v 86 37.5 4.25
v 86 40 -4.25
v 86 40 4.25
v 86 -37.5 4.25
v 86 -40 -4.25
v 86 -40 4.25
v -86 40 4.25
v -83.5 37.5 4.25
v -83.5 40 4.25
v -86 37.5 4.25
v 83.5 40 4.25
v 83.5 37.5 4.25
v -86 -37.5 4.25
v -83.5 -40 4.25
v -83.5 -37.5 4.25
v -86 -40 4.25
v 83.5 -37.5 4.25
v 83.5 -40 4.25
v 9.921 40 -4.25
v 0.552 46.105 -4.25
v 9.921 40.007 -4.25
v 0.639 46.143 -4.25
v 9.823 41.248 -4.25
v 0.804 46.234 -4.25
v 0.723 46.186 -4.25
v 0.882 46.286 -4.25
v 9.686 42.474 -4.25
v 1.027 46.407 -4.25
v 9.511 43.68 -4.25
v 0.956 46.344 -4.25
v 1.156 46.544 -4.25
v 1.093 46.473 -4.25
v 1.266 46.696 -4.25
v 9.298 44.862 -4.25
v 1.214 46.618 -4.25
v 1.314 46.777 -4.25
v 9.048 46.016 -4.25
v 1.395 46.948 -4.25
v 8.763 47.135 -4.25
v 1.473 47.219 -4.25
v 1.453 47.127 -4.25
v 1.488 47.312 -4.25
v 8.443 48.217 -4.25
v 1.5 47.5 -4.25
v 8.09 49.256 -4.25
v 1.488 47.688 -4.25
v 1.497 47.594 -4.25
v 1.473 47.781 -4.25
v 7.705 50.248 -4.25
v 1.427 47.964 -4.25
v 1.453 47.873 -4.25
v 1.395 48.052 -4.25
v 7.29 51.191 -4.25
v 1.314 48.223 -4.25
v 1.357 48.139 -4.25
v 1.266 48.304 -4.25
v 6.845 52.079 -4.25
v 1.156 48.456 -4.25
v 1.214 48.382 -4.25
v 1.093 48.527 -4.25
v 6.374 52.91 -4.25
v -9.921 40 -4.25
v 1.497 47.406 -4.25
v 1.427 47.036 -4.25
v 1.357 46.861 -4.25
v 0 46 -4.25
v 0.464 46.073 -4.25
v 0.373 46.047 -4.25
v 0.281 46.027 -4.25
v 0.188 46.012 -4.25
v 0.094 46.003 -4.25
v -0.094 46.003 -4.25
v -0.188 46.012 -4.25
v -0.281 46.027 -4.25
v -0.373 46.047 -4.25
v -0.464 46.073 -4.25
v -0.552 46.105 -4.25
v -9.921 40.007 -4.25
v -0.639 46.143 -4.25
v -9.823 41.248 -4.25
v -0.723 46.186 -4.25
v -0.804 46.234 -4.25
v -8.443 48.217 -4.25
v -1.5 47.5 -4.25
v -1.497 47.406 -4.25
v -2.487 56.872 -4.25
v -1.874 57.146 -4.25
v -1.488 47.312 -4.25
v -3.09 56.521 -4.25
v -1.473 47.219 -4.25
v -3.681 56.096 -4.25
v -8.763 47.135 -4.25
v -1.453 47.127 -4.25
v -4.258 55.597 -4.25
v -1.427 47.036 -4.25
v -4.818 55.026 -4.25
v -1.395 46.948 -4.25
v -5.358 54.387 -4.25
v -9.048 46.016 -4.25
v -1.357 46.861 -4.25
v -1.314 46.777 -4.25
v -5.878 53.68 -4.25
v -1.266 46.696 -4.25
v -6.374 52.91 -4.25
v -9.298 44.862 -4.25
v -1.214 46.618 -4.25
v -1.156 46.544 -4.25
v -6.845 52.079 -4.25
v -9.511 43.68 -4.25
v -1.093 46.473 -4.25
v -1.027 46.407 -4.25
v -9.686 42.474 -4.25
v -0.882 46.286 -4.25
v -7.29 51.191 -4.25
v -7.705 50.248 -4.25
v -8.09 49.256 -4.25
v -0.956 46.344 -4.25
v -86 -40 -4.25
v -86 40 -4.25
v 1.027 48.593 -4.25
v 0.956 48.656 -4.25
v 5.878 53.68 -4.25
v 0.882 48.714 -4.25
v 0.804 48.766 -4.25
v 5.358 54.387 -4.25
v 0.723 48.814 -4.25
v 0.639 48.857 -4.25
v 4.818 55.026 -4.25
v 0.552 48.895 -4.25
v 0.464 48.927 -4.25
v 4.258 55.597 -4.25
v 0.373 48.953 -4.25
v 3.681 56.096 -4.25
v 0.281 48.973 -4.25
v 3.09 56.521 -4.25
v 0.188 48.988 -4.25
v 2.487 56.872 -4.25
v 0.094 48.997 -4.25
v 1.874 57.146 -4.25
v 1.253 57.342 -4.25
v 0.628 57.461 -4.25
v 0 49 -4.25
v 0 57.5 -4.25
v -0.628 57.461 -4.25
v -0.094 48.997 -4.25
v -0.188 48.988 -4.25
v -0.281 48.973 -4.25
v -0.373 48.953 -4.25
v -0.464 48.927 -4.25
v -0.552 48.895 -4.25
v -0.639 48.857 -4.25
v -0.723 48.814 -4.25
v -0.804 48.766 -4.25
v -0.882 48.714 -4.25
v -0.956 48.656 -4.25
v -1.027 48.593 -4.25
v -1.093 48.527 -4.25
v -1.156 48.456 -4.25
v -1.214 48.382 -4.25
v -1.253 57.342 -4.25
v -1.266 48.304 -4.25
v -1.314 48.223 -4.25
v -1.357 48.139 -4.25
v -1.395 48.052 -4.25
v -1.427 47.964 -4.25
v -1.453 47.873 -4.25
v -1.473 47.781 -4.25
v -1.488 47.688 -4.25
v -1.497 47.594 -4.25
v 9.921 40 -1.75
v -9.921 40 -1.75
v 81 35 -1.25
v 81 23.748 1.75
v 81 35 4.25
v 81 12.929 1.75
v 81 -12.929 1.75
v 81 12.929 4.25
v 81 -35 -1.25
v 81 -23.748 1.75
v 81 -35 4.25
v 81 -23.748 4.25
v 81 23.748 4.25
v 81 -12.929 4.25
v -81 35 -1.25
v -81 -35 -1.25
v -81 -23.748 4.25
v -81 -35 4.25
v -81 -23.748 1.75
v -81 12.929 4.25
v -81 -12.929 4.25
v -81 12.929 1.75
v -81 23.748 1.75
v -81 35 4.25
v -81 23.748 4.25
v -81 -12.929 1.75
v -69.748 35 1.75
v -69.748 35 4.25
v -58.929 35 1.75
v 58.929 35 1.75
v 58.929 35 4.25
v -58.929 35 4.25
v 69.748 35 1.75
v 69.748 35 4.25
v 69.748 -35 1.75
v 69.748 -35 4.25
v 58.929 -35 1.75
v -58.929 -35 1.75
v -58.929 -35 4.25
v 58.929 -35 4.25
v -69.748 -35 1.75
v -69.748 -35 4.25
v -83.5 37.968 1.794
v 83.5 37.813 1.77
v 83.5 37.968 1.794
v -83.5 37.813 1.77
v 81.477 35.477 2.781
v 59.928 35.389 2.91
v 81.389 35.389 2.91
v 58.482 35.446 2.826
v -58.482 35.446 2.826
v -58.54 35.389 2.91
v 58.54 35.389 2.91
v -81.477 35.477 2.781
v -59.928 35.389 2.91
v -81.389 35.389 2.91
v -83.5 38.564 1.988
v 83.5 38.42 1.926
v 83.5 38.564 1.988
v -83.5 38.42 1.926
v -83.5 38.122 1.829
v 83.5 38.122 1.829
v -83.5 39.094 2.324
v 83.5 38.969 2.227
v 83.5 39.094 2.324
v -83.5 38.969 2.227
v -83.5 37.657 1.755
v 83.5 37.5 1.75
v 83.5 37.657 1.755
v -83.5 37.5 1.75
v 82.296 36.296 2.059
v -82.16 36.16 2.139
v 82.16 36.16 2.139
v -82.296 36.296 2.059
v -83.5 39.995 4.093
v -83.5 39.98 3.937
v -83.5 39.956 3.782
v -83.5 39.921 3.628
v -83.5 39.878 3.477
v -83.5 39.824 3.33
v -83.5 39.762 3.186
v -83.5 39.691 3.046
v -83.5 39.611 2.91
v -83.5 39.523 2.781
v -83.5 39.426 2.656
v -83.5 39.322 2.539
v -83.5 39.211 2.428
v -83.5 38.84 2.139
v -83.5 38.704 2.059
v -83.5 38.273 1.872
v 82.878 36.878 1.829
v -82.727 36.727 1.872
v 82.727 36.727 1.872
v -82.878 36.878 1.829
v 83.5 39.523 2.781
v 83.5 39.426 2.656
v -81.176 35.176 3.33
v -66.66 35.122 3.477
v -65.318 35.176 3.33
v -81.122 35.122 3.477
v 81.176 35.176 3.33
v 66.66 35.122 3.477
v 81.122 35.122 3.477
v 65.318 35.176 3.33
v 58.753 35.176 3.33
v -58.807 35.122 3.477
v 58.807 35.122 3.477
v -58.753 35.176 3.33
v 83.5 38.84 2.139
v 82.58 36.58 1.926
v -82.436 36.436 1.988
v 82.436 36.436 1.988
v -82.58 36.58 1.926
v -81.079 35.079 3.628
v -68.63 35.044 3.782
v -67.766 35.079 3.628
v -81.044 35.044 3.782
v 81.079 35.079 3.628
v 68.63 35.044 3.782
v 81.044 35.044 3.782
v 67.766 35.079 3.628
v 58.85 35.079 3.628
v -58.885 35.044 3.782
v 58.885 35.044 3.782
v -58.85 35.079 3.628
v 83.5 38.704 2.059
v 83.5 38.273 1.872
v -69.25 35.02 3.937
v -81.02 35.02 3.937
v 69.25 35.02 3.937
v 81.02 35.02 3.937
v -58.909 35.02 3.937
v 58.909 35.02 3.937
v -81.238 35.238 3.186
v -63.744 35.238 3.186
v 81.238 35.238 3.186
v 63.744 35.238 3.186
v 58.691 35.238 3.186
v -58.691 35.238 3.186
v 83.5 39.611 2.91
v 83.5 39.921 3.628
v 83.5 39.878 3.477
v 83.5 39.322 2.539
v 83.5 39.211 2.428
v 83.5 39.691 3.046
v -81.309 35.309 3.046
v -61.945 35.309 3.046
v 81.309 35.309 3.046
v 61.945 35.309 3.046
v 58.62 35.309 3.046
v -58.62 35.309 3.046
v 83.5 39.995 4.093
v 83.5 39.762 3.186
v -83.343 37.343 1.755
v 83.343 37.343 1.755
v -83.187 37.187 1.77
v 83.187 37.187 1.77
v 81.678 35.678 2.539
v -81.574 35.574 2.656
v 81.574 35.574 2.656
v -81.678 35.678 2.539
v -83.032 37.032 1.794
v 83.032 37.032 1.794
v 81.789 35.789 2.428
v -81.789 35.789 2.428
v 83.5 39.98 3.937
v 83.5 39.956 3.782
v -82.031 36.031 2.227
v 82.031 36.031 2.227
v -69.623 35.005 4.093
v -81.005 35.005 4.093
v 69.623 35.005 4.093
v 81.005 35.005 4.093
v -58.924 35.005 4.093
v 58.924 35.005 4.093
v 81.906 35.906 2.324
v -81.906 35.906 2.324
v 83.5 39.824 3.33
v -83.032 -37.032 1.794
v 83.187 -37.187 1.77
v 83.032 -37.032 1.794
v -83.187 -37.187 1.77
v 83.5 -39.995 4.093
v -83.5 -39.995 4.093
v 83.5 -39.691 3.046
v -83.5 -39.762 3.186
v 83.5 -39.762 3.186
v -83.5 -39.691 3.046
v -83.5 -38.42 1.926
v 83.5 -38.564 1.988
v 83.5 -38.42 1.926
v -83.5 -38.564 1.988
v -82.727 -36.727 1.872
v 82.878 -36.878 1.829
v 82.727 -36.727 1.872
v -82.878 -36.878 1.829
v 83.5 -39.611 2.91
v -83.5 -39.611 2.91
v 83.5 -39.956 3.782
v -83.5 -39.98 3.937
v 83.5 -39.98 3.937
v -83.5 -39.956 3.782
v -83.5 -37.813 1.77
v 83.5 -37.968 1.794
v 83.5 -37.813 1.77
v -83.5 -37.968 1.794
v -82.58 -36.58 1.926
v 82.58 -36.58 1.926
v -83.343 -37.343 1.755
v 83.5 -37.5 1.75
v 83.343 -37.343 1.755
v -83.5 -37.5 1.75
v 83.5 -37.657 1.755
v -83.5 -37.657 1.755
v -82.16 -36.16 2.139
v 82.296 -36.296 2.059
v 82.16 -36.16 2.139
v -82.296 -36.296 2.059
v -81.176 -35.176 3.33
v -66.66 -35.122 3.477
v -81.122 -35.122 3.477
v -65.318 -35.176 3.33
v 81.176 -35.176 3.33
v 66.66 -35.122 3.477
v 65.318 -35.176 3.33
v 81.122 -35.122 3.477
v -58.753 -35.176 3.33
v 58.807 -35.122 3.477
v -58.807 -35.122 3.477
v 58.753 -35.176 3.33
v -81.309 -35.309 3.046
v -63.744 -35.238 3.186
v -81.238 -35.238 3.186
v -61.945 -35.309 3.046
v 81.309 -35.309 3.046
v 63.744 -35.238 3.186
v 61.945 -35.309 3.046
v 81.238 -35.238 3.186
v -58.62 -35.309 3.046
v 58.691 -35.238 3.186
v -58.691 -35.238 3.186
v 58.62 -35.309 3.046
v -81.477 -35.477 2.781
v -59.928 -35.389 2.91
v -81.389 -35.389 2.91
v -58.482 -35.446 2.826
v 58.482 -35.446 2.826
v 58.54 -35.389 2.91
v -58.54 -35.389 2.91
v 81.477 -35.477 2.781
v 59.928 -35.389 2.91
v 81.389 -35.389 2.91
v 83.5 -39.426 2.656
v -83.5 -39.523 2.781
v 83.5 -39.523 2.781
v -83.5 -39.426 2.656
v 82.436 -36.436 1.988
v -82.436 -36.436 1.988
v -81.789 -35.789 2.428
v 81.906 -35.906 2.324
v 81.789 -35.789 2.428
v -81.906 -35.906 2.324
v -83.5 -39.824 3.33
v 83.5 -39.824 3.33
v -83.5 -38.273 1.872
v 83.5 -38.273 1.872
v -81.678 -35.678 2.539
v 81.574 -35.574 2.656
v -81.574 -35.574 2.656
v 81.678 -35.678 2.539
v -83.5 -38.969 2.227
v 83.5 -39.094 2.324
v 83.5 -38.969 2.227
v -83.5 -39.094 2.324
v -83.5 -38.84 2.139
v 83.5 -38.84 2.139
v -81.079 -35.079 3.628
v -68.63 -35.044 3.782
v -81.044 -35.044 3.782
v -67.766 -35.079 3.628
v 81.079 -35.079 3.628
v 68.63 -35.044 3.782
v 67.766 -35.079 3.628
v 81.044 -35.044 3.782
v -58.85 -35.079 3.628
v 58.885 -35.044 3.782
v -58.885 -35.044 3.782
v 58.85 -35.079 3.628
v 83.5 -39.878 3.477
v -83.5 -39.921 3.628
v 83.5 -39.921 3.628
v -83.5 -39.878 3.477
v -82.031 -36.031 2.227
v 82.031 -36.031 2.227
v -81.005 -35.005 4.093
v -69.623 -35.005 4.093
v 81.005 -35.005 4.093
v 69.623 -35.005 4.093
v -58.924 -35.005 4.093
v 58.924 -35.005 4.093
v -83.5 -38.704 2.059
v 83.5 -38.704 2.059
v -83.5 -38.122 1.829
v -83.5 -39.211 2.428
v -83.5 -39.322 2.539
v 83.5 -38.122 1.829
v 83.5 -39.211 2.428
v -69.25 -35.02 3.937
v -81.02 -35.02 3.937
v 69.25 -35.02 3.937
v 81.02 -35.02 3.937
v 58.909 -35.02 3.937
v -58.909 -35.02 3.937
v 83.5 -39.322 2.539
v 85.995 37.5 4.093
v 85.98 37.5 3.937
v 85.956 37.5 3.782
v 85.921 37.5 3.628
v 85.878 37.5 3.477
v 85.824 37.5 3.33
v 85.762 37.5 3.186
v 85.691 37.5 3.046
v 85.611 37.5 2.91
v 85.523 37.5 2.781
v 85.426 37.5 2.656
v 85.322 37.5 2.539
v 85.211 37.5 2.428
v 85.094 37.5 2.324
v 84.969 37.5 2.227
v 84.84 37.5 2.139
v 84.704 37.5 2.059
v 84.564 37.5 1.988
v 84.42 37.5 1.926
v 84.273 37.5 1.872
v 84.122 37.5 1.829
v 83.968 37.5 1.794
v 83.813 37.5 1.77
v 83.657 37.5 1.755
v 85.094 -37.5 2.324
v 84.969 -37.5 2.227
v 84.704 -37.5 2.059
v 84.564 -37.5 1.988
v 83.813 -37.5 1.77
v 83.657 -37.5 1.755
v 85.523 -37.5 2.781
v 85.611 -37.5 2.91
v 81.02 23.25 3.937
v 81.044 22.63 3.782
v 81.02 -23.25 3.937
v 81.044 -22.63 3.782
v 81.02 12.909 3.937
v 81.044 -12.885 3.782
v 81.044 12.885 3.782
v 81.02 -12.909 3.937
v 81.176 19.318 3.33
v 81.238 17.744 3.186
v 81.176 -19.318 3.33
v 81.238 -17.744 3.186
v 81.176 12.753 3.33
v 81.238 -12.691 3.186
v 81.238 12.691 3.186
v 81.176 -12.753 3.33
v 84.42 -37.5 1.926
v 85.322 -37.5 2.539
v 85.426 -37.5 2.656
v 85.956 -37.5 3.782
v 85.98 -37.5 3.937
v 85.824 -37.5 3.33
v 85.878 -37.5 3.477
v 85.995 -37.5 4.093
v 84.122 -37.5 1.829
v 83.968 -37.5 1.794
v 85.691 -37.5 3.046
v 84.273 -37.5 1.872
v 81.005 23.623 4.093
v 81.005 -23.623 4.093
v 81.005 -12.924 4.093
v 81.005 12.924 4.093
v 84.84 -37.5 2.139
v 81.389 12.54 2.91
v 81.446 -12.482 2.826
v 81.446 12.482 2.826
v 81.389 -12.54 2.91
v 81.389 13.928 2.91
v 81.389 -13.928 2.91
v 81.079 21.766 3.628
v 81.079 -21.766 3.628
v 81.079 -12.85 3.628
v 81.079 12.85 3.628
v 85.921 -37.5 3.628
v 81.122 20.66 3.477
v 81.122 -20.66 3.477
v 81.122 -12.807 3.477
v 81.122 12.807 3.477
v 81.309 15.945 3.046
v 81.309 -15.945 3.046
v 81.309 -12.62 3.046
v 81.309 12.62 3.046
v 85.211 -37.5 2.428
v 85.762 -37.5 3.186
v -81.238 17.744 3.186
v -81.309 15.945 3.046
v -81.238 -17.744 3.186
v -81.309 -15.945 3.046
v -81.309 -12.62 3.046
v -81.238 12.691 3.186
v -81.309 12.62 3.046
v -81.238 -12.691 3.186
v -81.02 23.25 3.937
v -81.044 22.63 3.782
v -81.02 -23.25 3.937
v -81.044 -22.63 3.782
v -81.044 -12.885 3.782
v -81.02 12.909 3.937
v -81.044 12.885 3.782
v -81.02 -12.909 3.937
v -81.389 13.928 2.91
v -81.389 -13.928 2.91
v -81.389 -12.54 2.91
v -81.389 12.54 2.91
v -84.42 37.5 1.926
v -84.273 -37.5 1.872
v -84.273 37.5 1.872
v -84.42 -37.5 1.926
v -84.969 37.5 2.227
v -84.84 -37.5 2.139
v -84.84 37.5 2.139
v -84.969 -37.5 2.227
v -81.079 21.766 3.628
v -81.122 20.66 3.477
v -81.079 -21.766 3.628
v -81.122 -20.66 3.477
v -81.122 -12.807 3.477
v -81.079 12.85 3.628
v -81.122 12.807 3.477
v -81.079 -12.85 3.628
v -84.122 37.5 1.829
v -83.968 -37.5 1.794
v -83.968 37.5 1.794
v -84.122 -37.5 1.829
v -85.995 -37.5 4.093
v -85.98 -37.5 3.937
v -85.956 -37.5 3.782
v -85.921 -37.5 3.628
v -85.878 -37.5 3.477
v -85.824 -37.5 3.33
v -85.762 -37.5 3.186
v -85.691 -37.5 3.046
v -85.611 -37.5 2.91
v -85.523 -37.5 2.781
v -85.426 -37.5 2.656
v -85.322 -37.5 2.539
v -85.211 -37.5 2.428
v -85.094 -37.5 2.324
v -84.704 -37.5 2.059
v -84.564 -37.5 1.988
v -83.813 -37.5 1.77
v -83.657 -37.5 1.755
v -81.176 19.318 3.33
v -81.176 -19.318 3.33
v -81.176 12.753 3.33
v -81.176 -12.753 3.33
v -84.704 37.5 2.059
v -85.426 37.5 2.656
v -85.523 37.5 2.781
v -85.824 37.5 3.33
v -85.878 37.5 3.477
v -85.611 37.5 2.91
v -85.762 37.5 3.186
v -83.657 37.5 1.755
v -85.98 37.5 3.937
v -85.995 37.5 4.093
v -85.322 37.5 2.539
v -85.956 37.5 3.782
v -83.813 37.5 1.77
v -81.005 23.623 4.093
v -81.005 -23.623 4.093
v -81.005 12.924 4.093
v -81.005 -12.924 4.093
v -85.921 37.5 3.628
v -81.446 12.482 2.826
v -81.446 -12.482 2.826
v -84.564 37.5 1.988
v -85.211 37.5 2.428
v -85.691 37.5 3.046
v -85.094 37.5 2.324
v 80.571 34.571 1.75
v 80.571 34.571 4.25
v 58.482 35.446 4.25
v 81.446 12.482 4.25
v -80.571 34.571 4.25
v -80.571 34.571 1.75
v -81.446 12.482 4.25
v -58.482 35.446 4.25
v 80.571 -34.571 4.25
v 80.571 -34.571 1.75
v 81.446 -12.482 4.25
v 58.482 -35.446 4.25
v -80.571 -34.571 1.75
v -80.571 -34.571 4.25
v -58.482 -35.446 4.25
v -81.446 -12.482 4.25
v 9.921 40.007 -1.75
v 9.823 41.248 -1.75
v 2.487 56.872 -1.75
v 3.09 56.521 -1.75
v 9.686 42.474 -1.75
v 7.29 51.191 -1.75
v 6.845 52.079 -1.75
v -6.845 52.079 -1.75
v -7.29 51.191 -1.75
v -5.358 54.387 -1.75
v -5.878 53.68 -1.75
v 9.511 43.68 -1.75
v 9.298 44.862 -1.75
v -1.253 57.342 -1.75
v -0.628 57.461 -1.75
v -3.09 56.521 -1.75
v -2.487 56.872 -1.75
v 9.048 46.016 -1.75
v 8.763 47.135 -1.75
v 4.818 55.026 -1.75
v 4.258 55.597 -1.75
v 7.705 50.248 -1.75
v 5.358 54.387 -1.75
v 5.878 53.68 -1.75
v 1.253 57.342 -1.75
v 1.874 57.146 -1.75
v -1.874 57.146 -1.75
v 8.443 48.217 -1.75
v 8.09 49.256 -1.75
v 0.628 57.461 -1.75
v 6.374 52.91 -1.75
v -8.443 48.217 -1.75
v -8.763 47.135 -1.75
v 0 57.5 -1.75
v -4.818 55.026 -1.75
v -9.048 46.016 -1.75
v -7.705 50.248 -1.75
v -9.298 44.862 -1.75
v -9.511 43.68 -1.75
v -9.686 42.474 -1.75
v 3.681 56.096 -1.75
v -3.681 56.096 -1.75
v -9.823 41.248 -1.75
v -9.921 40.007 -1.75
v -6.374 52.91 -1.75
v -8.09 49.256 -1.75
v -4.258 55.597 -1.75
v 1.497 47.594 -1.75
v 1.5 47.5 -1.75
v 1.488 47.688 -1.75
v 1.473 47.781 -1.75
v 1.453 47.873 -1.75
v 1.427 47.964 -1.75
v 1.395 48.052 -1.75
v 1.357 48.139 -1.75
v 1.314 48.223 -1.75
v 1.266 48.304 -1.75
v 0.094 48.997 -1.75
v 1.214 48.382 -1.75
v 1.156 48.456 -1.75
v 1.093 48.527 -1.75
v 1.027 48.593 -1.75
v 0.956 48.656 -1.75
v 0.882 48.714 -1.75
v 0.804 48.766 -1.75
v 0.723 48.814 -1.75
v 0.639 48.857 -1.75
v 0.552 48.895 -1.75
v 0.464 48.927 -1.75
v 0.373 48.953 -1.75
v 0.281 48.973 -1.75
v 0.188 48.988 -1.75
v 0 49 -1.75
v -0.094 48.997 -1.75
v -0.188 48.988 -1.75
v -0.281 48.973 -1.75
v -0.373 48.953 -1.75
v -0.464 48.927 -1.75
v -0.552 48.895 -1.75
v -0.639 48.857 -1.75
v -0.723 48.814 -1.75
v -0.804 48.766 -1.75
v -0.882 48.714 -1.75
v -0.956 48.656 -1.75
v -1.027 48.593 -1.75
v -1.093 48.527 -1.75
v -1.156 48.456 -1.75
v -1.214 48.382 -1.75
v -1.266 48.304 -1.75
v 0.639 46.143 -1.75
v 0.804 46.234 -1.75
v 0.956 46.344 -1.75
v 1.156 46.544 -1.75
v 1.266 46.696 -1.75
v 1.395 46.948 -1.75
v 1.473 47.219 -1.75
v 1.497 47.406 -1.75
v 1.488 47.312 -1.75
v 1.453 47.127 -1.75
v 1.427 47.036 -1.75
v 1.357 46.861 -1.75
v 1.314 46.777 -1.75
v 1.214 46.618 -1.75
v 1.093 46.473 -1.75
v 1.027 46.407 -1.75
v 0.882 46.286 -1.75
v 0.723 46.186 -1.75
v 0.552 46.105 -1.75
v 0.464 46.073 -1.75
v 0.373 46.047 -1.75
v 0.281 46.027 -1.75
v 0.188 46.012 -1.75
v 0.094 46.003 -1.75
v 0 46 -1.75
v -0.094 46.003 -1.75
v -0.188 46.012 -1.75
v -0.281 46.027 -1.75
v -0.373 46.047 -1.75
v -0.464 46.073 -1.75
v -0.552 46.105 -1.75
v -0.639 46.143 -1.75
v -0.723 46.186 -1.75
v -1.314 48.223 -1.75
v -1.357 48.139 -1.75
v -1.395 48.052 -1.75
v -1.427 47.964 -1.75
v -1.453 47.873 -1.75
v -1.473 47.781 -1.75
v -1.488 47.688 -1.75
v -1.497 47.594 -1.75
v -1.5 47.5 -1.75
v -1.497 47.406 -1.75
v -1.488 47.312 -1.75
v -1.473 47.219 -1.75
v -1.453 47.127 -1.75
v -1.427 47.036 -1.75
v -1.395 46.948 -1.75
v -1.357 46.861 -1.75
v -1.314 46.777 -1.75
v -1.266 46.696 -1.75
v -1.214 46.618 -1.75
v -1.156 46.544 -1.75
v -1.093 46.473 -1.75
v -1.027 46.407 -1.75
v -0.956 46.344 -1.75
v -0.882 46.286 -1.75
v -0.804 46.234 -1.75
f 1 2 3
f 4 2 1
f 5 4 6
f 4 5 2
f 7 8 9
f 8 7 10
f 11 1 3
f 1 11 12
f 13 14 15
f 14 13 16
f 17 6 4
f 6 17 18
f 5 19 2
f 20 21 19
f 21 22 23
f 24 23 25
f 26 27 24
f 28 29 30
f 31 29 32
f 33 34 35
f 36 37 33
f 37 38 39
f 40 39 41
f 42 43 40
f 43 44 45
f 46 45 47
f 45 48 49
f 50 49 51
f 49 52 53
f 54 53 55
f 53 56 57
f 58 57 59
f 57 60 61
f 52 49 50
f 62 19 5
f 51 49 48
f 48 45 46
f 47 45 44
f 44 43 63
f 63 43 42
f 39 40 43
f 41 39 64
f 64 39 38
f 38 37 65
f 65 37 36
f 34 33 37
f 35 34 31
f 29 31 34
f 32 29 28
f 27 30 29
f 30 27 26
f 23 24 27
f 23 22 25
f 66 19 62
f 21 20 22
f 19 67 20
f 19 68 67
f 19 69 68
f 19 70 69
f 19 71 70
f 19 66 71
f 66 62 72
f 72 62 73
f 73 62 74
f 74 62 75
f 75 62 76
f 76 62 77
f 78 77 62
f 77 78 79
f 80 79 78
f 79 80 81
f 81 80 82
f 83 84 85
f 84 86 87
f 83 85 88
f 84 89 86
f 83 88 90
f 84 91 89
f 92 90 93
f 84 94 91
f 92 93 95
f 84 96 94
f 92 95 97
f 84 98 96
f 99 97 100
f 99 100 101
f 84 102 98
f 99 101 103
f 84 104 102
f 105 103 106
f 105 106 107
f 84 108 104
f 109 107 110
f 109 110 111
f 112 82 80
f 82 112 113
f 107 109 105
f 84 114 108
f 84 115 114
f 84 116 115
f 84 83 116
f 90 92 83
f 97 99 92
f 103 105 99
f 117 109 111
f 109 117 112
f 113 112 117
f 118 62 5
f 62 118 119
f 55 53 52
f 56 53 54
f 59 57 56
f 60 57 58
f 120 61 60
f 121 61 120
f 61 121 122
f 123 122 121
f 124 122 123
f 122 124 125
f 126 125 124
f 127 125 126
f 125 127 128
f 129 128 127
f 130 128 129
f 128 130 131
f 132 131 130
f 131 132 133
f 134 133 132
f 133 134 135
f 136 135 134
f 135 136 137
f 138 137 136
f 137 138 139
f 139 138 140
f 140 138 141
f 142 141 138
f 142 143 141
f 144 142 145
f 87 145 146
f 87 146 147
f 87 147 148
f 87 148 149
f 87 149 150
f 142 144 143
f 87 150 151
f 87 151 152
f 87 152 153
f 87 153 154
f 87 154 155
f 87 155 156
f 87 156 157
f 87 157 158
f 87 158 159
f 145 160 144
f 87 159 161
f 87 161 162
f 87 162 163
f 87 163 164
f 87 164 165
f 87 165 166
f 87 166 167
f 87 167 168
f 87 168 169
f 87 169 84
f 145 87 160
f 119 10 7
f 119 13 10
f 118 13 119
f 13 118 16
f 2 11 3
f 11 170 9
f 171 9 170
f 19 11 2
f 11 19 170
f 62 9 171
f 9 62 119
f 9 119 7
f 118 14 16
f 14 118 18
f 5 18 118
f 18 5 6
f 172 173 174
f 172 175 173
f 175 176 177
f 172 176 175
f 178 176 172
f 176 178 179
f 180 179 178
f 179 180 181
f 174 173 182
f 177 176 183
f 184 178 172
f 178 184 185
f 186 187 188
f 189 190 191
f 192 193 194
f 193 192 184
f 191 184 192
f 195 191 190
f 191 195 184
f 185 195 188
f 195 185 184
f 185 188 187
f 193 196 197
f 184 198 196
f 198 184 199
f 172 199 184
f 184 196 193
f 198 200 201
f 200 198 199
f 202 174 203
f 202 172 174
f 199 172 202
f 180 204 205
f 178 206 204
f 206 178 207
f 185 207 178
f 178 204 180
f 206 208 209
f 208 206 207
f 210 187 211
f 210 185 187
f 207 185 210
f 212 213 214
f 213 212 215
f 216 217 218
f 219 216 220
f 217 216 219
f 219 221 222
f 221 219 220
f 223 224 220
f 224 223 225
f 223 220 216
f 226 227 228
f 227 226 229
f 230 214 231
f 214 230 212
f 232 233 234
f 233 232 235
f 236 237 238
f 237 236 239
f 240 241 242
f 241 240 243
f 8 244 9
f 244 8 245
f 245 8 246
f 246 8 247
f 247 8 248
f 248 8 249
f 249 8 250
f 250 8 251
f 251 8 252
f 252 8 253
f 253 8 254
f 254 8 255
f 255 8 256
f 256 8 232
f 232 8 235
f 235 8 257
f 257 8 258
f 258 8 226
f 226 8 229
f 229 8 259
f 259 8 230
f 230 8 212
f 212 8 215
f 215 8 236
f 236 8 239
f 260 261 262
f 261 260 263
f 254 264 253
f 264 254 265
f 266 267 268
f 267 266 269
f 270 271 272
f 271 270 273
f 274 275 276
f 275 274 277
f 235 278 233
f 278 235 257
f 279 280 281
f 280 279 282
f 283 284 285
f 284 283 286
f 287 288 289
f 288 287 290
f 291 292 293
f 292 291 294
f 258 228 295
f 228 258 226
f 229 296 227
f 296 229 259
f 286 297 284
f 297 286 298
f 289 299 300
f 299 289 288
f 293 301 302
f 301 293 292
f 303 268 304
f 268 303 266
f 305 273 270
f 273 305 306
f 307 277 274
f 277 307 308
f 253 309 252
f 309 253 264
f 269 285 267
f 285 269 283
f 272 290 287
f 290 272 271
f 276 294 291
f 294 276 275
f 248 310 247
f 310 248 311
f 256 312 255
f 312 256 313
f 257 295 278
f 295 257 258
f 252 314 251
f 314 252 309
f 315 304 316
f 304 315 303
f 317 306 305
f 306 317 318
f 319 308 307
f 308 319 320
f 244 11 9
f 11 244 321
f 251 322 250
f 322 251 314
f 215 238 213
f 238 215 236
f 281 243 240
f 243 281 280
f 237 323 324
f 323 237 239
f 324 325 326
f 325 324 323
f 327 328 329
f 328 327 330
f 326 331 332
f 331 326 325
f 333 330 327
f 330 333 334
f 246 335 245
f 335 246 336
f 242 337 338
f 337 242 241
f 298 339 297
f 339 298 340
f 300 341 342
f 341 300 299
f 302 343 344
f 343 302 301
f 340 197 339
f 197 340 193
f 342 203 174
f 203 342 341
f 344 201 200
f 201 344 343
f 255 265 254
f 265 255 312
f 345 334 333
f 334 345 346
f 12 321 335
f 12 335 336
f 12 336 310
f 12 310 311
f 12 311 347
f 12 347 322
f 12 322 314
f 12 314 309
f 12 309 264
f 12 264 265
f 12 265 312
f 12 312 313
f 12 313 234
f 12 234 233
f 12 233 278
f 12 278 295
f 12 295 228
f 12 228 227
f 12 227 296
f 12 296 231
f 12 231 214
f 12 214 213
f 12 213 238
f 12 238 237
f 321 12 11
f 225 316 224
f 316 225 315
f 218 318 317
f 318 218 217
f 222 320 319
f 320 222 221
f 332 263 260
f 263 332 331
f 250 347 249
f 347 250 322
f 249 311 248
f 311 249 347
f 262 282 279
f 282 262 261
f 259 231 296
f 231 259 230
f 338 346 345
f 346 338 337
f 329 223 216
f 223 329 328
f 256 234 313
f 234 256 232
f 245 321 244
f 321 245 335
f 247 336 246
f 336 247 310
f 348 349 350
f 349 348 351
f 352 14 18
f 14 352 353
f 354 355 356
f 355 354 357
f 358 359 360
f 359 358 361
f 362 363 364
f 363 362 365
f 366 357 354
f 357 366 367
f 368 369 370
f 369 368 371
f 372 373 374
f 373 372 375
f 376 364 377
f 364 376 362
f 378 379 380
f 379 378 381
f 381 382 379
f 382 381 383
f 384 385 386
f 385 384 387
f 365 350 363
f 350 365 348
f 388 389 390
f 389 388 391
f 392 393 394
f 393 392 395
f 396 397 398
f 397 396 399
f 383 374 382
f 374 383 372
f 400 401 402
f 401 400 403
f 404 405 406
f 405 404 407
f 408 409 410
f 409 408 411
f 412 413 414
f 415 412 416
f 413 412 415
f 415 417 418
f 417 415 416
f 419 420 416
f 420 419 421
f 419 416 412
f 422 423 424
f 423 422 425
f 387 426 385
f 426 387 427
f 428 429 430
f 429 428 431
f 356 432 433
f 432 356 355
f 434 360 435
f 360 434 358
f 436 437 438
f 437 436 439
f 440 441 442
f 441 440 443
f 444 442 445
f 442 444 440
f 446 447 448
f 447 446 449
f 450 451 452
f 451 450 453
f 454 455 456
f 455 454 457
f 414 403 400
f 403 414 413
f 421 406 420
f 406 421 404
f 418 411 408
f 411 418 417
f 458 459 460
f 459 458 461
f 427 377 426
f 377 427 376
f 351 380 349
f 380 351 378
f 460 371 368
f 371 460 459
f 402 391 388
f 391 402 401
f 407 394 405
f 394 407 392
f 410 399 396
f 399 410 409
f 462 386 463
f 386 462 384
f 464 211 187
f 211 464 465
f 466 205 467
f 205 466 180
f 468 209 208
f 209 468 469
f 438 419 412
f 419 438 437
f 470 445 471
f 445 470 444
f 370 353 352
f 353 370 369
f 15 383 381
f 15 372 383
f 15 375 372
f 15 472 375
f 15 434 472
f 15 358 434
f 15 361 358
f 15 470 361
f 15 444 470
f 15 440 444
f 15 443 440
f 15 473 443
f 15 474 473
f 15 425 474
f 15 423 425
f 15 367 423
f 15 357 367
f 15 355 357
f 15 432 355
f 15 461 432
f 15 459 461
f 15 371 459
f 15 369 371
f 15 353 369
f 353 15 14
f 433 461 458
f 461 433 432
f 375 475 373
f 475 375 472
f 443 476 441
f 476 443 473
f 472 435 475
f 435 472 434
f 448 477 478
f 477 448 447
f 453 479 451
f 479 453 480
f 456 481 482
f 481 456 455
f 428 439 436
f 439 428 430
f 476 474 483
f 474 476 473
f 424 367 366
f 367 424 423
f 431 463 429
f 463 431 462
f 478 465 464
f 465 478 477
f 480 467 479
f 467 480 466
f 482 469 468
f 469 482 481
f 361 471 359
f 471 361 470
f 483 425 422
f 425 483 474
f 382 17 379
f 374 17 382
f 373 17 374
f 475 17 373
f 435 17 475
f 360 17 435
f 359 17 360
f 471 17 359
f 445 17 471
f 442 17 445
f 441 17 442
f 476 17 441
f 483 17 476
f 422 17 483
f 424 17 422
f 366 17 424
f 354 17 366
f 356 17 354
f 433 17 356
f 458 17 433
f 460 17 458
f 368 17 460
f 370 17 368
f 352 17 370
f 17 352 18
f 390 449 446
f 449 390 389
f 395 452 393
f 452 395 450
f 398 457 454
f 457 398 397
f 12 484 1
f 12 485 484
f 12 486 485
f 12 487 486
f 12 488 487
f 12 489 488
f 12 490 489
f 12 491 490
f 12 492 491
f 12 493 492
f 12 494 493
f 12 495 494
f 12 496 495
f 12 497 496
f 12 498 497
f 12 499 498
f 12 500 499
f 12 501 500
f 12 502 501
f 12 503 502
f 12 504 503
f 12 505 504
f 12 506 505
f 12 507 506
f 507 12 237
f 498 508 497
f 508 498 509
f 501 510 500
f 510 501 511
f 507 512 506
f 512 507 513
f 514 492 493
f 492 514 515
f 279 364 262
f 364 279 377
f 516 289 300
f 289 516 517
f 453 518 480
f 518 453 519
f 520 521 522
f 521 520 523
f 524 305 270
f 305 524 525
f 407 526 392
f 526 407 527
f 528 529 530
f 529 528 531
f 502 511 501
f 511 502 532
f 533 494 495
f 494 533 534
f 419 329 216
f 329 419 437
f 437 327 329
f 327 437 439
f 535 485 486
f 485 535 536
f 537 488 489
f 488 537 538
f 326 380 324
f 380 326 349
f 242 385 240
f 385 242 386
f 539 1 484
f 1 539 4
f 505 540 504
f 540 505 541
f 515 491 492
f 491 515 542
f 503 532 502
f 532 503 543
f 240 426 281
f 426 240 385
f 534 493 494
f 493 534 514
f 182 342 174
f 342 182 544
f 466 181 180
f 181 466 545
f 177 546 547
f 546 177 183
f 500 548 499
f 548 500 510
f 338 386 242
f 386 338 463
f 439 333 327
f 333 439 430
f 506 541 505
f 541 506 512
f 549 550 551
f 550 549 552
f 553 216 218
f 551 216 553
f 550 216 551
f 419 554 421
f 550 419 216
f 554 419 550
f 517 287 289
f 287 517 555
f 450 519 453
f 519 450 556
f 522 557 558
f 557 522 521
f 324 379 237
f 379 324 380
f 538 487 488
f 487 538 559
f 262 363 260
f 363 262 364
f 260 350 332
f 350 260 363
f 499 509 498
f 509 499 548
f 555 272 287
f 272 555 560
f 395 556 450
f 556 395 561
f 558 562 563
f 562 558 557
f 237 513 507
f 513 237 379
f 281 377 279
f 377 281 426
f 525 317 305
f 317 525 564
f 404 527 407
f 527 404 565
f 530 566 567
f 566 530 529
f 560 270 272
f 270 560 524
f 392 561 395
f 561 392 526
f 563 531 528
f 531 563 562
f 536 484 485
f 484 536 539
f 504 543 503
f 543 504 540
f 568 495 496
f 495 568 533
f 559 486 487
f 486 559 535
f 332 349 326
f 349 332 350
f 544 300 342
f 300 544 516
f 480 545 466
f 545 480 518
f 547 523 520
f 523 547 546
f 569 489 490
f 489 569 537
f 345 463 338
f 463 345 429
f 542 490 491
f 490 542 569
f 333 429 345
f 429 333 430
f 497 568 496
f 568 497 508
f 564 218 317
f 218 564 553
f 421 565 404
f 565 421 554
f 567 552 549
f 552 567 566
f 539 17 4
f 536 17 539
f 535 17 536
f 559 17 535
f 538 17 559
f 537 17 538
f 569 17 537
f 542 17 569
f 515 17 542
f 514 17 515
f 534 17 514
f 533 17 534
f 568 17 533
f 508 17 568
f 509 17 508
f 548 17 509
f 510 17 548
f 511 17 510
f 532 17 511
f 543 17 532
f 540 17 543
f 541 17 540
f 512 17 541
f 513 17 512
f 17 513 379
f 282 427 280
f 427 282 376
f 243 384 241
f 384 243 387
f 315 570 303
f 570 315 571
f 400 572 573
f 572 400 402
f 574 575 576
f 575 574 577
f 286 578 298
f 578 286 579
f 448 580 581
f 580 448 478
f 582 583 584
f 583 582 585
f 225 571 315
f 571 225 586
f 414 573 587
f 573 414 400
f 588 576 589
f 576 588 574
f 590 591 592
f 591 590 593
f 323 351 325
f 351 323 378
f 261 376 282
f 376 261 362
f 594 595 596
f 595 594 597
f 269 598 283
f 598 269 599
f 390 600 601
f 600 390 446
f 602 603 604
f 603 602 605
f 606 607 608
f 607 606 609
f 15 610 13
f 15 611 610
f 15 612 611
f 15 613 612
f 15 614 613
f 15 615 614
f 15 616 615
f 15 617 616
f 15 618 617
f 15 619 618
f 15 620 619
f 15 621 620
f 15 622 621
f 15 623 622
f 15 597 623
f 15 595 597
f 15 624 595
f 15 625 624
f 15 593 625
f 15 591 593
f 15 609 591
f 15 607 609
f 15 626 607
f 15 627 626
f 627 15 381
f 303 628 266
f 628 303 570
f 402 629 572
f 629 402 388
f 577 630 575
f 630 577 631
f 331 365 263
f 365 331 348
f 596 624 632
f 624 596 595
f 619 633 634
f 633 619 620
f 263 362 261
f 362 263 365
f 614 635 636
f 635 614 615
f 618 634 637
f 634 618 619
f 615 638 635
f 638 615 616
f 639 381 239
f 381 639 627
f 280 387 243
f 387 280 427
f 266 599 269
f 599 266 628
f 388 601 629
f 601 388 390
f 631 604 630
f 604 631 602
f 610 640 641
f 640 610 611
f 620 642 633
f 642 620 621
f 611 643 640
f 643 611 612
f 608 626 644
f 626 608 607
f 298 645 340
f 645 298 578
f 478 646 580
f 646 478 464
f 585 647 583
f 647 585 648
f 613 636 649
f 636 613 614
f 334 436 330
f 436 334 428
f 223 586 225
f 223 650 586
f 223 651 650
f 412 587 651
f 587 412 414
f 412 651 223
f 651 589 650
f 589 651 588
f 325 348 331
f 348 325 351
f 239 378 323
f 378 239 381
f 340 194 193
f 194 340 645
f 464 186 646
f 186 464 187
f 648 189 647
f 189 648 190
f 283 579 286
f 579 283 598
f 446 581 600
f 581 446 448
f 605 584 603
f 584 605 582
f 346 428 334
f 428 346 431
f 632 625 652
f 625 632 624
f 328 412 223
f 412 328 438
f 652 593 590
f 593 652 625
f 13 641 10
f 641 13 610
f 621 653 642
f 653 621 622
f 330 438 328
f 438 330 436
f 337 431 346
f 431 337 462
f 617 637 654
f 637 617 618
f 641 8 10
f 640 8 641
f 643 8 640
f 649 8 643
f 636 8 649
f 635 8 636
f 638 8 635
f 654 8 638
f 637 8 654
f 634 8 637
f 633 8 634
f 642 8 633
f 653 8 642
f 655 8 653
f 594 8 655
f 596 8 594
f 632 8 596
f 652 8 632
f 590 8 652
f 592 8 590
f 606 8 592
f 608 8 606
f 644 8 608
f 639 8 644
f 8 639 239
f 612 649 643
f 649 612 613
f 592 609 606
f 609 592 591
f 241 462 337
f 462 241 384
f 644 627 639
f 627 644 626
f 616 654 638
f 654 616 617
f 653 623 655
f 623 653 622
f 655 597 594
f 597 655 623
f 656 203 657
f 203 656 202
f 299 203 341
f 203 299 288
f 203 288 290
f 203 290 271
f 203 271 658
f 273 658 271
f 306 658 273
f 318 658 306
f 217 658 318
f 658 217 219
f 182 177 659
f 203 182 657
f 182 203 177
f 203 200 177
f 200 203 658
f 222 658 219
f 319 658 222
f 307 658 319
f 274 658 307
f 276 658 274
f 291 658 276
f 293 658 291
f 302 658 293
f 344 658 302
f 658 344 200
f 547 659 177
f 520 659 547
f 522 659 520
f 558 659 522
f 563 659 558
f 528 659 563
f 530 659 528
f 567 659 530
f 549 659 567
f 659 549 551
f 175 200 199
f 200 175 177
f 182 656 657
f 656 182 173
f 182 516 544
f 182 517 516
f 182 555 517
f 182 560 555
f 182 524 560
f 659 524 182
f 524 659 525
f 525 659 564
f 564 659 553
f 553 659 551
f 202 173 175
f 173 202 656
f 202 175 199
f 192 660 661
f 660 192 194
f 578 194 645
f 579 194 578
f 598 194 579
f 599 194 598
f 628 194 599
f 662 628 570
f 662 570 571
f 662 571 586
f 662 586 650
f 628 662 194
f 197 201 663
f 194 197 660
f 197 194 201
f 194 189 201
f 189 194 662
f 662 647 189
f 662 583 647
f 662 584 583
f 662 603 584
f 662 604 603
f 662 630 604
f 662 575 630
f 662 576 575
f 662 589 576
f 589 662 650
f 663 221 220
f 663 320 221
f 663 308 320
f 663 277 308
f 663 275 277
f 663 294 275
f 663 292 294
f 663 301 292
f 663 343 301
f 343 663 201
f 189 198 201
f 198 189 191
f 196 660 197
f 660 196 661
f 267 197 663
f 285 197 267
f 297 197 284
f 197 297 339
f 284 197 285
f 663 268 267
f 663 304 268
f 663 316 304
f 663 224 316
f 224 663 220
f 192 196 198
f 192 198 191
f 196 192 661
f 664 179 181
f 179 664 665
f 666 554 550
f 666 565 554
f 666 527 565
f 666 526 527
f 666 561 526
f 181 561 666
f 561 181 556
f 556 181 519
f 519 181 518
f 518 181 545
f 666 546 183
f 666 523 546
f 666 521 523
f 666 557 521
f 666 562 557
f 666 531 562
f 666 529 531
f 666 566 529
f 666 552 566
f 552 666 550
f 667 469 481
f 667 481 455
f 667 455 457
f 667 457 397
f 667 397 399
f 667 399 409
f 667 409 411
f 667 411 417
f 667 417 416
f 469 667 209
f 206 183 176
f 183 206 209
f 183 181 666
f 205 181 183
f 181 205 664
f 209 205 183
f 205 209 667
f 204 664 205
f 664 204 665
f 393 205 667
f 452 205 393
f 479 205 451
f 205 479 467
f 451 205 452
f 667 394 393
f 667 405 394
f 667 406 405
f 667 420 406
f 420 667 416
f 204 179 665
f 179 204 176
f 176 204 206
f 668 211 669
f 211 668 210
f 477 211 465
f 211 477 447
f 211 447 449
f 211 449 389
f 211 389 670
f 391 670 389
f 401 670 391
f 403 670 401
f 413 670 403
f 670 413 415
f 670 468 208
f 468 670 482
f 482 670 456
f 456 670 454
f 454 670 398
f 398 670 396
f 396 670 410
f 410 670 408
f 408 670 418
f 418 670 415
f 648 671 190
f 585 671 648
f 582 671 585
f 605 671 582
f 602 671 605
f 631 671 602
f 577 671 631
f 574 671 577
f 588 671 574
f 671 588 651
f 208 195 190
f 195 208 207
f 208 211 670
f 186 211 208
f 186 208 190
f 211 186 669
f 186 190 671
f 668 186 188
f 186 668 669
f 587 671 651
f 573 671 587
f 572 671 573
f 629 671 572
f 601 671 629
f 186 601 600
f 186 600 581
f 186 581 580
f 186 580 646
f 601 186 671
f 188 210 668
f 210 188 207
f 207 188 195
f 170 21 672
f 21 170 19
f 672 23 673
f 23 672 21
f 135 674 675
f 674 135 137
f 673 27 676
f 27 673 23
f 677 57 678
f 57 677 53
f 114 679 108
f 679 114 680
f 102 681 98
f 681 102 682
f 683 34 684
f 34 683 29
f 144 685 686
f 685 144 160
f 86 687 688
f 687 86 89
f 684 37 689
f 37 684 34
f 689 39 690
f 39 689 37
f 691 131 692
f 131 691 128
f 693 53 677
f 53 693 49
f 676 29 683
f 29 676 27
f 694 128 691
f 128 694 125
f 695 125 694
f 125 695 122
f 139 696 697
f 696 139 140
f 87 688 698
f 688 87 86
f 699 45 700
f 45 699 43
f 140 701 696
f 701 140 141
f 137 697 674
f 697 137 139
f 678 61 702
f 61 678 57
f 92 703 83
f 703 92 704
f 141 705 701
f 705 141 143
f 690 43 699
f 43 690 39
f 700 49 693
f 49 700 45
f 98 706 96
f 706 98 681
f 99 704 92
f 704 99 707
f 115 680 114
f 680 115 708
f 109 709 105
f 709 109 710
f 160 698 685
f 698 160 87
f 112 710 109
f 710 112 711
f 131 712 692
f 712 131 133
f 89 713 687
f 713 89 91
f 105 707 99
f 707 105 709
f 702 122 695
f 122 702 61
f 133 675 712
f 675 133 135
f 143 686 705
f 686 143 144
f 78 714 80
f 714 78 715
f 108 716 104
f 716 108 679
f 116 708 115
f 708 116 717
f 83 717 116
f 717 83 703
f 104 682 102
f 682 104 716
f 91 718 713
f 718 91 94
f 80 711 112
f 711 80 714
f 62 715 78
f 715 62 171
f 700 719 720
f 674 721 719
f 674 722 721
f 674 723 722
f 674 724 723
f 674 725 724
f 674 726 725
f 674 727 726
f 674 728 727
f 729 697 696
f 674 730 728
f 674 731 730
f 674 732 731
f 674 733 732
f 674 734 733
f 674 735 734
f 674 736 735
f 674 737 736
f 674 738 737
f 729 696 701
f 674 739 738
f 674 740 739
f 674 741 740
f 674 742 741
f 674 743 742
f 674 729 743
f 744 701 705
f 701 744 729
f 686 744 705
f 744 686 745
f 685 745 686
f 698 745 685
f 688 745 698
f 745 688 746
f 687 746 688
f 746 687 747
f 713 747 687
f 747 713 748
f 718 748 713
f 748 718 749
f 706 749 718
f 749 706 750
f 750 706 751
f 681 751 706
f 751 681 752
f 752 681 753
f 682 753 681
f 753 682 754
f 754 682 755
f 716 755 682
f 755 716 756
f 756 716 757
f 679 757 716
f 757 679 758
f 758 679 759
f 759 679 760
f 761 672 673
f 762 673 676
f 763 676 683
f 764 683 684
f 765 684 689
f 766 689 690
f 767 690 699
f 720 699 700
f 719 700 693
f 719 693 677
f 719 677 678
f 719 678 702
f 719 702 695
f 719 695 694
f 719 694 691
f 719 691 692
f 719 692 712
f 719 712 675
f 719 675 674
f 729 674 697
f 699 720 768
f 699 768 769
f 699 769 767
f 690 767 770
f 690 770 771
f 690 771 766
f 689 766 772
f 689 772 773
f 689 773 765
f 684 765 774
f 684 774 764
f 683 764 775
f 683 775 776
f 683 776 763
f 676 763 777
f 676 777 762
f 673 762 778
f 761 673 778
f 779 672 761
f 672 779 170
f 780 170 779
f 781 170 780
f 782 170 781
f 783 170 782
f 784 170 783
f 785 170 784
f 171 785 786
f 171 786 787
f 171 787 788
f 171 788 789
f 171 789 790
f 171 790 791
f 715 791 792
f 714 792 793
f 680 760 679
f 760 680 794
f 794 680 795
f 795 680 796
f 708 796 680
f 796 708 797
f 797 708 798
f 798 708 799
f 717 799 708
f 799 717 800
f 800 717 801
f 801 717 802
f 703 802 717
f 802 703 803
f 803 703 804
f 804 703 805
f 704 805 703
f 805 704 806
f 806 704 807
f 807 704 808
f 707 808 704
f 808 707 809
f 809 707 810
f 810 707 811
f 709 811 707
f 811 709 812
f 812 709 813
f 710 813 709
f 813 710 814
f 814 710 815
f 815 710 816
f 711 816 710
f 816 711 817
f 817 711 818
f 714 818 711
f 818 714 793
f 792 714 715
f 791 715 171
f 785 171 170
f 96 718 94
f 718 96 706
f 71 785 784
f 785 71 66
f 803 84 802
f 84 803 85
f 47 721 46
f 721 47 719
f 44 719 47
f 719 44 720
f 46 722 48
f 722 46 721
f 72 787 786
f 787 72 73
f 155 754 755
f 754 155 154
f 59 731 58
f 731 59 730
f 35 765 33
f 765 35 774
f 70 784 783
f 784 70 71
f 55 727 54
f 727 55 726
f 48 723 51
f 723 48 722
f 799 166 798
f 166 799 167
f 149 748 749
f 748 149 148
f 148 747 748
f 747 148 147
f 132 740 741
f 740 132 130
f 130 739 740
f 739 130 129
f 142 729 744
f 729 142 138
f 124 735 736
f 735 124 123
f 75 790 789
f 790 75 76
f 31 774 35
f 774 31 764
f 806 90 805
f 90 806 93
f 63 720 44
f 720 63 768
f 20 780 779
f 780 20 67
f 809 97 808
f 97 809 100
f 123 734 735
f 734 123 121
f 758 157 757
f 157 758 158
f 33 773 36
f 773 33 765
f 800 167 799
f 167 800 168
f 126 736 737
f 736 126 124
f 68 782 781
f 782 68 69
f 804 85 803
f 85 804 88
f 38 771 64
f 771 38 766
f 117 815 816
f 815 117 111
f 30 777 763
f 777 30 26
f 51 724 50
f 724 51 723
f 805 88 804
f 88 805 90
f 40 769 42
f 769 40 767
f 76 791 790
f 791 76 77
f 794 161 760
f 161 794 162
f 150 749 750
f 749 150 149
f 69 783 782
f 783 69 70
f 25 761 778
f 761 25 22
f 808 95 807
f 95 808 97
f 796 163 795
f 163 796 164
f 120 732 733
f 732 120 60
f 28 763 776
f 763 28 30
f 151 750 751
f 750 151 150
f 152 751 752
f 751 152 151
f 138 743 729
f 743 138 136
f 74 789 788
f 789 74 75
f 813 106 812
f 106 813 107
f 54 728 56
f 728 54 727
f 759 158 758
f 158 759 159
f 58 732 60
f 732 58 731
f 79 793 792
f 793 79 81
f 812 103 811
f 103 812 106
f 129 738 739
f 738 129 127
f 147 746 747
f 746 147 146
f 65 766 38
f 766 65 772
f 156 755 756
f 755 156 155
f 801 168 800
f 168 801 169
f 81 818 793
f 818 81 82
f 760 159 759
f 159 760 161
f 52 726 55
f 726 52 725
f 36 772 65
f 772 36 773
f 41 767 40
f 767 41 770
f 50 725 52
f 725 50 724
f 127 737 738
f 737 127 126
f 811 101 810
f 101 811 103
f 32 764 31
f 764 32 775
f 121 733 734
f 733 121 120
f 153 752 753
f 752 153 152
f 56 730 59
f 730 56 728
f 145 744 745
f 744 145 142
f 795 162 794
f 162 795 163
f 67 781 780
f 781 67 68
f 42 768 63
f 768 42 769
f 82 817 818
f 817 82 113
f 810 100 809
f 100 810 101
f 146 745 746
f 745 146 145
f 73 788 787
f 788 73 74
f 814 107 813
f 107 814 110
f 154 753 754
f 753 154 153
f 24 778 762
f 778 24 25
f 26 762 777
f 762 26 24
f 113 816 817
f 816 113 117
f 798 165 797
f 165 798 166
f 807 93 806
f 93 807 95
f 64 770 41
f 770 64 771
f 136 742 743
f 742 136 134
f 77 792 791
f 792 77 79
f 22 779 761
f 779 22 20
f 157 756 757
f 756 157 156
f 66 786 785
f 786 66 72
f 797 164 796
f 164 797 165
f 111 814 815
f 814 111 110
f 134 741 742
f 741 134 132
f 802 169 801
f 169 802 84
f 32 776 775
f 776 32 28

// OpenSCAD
billLength = 162;
billWidth = 70;
billThick = 5;
frameThickX = 5;
frameThickY = 5;
frameShapeStyle = 1;
frameThick = 1;
botThick = 2.5;
triangleThick = 2.5;
triangleLength = 20;
triangleWidth = 37.5;
triangleMode = 3;
hookLength = 20;
hookWidth = 20;
hookThick = 2.5;
hookHole = 3;
hookHoleUp = 0;
sfn = 100;
extraCut = 1;


module frame() {
    difference() {
        cube([billLength + frameThickX*2, billWidth + frameThickY*2, frameThick+botThick+billThick], center=true);
        translate([0,0,botThick/2+1]) {
            cube([billLength, billWidth,  frameThick+billThick+1], center=true);
        }
    }
}




module frameShapeX() {
    rotate([0,90,0]) {
        cylinder(r=frameThickX/2, h=billLength+frameThickX*frameShapeStyle, center=true, $fn=sfn);
    }
}
module frameShapeY() {
    rotate([90,0,0]) {
        cylinder(r=frameThickY/2, h=billWidth+frameThickY*frameShapeStyle, center=true, $fn=sfn);
    }
}


module frameTriangle() {
    scale([1,triangleWidth/triangleLength, 1]) {
        cylinder(r=triangleLength/2, h=triangleThick, center=true, $fn=3);
    }
}

module frameShapingX() {
    translate([0,(billWidth+frameThickY)/2,(billThick+botThick+frameThick)/2]) {
        frameShapeX();
    }
    translate([0,(billWidth+frameThickY)/-2,(billThick+botThick+frameThick)/2]) {
        frameShapeX();
    }
}

module frameShapingY() {
    translate([(billLength+frameThickX)/2,0,(billThick+botThick+frameThick)/2]) {
        frameShapeY();
    }
    translate([(billLength+frameThickX)/-2,0/-2,(billThick+botThick+frameThick)/2]) {
        frameShapeY();
    }
}


module frameTriangles() {
    translate([(billLength-frameThickX*triangleMode)/2,(billWidth-frameThickY*triangleMode)/2, (billThick+botThick+frameThick-triangleThick)/2]) {
        rotate([0,0,45]) {
            frameTriangle();
        }
        
    }
    translate([(billLength-frameThickX*triangleMode)/-2,(billWidth-frameThickY*triangleMode)/2, (billThick+botThick+frameThick-triangleThick)/2]) {
        rotate([0,0,135]) {
            frameTriangle();
        }
        
    }
    
    translate([(billLength-frameThickX*triangleMode)/2,(billWidth-frameThickY*triangleMode)/-2, (billThick+botThick+frameThick-triangleThick)/2]) {
        rotate([0,0,315]) {
            frameTriangle();
        }
        
    }
    translate([(billLength-frameThickX*triangleMode)/-2,(billWidth-frameThickY*triangleMode)/-2, (billThick+botThick+frameThick-triangleThick)/2]) {
        rotate([0,0,225]) {
            frameTriangle();
        }
        
    }
}
module shapedFrame() {
    difference() {
        frame();
        frameShapingX();
        frameShapingY();
    }
}


module hook() {
    translate([0,(billWidth+frameThickY)/2,(billThick+botThick+frameThick-hookThick)/-2]) {
        difference() {
            scale([1,hookLength*2/hookWidth, 1]) {
                cylinder(r=hookWidth/2, h=hookThick, center=true, $fn=sfn);
            }
            translate([0,hookLength/-2,0]) {
                cube([hookWidth+extraCut,hookLength, hookThick+extraCut], center=true);
            }
            translate([0,hookLength/2+hookHoleUp,0]) {
                cylinder(r=hookHole/2, h=hookThick+extraCut, center=true, $fn=sfn);
        }
        }
    }
}

module fullFrame() {
    shapedFrame();
    frameTriangles();
    hook();

}

fullFrame();
